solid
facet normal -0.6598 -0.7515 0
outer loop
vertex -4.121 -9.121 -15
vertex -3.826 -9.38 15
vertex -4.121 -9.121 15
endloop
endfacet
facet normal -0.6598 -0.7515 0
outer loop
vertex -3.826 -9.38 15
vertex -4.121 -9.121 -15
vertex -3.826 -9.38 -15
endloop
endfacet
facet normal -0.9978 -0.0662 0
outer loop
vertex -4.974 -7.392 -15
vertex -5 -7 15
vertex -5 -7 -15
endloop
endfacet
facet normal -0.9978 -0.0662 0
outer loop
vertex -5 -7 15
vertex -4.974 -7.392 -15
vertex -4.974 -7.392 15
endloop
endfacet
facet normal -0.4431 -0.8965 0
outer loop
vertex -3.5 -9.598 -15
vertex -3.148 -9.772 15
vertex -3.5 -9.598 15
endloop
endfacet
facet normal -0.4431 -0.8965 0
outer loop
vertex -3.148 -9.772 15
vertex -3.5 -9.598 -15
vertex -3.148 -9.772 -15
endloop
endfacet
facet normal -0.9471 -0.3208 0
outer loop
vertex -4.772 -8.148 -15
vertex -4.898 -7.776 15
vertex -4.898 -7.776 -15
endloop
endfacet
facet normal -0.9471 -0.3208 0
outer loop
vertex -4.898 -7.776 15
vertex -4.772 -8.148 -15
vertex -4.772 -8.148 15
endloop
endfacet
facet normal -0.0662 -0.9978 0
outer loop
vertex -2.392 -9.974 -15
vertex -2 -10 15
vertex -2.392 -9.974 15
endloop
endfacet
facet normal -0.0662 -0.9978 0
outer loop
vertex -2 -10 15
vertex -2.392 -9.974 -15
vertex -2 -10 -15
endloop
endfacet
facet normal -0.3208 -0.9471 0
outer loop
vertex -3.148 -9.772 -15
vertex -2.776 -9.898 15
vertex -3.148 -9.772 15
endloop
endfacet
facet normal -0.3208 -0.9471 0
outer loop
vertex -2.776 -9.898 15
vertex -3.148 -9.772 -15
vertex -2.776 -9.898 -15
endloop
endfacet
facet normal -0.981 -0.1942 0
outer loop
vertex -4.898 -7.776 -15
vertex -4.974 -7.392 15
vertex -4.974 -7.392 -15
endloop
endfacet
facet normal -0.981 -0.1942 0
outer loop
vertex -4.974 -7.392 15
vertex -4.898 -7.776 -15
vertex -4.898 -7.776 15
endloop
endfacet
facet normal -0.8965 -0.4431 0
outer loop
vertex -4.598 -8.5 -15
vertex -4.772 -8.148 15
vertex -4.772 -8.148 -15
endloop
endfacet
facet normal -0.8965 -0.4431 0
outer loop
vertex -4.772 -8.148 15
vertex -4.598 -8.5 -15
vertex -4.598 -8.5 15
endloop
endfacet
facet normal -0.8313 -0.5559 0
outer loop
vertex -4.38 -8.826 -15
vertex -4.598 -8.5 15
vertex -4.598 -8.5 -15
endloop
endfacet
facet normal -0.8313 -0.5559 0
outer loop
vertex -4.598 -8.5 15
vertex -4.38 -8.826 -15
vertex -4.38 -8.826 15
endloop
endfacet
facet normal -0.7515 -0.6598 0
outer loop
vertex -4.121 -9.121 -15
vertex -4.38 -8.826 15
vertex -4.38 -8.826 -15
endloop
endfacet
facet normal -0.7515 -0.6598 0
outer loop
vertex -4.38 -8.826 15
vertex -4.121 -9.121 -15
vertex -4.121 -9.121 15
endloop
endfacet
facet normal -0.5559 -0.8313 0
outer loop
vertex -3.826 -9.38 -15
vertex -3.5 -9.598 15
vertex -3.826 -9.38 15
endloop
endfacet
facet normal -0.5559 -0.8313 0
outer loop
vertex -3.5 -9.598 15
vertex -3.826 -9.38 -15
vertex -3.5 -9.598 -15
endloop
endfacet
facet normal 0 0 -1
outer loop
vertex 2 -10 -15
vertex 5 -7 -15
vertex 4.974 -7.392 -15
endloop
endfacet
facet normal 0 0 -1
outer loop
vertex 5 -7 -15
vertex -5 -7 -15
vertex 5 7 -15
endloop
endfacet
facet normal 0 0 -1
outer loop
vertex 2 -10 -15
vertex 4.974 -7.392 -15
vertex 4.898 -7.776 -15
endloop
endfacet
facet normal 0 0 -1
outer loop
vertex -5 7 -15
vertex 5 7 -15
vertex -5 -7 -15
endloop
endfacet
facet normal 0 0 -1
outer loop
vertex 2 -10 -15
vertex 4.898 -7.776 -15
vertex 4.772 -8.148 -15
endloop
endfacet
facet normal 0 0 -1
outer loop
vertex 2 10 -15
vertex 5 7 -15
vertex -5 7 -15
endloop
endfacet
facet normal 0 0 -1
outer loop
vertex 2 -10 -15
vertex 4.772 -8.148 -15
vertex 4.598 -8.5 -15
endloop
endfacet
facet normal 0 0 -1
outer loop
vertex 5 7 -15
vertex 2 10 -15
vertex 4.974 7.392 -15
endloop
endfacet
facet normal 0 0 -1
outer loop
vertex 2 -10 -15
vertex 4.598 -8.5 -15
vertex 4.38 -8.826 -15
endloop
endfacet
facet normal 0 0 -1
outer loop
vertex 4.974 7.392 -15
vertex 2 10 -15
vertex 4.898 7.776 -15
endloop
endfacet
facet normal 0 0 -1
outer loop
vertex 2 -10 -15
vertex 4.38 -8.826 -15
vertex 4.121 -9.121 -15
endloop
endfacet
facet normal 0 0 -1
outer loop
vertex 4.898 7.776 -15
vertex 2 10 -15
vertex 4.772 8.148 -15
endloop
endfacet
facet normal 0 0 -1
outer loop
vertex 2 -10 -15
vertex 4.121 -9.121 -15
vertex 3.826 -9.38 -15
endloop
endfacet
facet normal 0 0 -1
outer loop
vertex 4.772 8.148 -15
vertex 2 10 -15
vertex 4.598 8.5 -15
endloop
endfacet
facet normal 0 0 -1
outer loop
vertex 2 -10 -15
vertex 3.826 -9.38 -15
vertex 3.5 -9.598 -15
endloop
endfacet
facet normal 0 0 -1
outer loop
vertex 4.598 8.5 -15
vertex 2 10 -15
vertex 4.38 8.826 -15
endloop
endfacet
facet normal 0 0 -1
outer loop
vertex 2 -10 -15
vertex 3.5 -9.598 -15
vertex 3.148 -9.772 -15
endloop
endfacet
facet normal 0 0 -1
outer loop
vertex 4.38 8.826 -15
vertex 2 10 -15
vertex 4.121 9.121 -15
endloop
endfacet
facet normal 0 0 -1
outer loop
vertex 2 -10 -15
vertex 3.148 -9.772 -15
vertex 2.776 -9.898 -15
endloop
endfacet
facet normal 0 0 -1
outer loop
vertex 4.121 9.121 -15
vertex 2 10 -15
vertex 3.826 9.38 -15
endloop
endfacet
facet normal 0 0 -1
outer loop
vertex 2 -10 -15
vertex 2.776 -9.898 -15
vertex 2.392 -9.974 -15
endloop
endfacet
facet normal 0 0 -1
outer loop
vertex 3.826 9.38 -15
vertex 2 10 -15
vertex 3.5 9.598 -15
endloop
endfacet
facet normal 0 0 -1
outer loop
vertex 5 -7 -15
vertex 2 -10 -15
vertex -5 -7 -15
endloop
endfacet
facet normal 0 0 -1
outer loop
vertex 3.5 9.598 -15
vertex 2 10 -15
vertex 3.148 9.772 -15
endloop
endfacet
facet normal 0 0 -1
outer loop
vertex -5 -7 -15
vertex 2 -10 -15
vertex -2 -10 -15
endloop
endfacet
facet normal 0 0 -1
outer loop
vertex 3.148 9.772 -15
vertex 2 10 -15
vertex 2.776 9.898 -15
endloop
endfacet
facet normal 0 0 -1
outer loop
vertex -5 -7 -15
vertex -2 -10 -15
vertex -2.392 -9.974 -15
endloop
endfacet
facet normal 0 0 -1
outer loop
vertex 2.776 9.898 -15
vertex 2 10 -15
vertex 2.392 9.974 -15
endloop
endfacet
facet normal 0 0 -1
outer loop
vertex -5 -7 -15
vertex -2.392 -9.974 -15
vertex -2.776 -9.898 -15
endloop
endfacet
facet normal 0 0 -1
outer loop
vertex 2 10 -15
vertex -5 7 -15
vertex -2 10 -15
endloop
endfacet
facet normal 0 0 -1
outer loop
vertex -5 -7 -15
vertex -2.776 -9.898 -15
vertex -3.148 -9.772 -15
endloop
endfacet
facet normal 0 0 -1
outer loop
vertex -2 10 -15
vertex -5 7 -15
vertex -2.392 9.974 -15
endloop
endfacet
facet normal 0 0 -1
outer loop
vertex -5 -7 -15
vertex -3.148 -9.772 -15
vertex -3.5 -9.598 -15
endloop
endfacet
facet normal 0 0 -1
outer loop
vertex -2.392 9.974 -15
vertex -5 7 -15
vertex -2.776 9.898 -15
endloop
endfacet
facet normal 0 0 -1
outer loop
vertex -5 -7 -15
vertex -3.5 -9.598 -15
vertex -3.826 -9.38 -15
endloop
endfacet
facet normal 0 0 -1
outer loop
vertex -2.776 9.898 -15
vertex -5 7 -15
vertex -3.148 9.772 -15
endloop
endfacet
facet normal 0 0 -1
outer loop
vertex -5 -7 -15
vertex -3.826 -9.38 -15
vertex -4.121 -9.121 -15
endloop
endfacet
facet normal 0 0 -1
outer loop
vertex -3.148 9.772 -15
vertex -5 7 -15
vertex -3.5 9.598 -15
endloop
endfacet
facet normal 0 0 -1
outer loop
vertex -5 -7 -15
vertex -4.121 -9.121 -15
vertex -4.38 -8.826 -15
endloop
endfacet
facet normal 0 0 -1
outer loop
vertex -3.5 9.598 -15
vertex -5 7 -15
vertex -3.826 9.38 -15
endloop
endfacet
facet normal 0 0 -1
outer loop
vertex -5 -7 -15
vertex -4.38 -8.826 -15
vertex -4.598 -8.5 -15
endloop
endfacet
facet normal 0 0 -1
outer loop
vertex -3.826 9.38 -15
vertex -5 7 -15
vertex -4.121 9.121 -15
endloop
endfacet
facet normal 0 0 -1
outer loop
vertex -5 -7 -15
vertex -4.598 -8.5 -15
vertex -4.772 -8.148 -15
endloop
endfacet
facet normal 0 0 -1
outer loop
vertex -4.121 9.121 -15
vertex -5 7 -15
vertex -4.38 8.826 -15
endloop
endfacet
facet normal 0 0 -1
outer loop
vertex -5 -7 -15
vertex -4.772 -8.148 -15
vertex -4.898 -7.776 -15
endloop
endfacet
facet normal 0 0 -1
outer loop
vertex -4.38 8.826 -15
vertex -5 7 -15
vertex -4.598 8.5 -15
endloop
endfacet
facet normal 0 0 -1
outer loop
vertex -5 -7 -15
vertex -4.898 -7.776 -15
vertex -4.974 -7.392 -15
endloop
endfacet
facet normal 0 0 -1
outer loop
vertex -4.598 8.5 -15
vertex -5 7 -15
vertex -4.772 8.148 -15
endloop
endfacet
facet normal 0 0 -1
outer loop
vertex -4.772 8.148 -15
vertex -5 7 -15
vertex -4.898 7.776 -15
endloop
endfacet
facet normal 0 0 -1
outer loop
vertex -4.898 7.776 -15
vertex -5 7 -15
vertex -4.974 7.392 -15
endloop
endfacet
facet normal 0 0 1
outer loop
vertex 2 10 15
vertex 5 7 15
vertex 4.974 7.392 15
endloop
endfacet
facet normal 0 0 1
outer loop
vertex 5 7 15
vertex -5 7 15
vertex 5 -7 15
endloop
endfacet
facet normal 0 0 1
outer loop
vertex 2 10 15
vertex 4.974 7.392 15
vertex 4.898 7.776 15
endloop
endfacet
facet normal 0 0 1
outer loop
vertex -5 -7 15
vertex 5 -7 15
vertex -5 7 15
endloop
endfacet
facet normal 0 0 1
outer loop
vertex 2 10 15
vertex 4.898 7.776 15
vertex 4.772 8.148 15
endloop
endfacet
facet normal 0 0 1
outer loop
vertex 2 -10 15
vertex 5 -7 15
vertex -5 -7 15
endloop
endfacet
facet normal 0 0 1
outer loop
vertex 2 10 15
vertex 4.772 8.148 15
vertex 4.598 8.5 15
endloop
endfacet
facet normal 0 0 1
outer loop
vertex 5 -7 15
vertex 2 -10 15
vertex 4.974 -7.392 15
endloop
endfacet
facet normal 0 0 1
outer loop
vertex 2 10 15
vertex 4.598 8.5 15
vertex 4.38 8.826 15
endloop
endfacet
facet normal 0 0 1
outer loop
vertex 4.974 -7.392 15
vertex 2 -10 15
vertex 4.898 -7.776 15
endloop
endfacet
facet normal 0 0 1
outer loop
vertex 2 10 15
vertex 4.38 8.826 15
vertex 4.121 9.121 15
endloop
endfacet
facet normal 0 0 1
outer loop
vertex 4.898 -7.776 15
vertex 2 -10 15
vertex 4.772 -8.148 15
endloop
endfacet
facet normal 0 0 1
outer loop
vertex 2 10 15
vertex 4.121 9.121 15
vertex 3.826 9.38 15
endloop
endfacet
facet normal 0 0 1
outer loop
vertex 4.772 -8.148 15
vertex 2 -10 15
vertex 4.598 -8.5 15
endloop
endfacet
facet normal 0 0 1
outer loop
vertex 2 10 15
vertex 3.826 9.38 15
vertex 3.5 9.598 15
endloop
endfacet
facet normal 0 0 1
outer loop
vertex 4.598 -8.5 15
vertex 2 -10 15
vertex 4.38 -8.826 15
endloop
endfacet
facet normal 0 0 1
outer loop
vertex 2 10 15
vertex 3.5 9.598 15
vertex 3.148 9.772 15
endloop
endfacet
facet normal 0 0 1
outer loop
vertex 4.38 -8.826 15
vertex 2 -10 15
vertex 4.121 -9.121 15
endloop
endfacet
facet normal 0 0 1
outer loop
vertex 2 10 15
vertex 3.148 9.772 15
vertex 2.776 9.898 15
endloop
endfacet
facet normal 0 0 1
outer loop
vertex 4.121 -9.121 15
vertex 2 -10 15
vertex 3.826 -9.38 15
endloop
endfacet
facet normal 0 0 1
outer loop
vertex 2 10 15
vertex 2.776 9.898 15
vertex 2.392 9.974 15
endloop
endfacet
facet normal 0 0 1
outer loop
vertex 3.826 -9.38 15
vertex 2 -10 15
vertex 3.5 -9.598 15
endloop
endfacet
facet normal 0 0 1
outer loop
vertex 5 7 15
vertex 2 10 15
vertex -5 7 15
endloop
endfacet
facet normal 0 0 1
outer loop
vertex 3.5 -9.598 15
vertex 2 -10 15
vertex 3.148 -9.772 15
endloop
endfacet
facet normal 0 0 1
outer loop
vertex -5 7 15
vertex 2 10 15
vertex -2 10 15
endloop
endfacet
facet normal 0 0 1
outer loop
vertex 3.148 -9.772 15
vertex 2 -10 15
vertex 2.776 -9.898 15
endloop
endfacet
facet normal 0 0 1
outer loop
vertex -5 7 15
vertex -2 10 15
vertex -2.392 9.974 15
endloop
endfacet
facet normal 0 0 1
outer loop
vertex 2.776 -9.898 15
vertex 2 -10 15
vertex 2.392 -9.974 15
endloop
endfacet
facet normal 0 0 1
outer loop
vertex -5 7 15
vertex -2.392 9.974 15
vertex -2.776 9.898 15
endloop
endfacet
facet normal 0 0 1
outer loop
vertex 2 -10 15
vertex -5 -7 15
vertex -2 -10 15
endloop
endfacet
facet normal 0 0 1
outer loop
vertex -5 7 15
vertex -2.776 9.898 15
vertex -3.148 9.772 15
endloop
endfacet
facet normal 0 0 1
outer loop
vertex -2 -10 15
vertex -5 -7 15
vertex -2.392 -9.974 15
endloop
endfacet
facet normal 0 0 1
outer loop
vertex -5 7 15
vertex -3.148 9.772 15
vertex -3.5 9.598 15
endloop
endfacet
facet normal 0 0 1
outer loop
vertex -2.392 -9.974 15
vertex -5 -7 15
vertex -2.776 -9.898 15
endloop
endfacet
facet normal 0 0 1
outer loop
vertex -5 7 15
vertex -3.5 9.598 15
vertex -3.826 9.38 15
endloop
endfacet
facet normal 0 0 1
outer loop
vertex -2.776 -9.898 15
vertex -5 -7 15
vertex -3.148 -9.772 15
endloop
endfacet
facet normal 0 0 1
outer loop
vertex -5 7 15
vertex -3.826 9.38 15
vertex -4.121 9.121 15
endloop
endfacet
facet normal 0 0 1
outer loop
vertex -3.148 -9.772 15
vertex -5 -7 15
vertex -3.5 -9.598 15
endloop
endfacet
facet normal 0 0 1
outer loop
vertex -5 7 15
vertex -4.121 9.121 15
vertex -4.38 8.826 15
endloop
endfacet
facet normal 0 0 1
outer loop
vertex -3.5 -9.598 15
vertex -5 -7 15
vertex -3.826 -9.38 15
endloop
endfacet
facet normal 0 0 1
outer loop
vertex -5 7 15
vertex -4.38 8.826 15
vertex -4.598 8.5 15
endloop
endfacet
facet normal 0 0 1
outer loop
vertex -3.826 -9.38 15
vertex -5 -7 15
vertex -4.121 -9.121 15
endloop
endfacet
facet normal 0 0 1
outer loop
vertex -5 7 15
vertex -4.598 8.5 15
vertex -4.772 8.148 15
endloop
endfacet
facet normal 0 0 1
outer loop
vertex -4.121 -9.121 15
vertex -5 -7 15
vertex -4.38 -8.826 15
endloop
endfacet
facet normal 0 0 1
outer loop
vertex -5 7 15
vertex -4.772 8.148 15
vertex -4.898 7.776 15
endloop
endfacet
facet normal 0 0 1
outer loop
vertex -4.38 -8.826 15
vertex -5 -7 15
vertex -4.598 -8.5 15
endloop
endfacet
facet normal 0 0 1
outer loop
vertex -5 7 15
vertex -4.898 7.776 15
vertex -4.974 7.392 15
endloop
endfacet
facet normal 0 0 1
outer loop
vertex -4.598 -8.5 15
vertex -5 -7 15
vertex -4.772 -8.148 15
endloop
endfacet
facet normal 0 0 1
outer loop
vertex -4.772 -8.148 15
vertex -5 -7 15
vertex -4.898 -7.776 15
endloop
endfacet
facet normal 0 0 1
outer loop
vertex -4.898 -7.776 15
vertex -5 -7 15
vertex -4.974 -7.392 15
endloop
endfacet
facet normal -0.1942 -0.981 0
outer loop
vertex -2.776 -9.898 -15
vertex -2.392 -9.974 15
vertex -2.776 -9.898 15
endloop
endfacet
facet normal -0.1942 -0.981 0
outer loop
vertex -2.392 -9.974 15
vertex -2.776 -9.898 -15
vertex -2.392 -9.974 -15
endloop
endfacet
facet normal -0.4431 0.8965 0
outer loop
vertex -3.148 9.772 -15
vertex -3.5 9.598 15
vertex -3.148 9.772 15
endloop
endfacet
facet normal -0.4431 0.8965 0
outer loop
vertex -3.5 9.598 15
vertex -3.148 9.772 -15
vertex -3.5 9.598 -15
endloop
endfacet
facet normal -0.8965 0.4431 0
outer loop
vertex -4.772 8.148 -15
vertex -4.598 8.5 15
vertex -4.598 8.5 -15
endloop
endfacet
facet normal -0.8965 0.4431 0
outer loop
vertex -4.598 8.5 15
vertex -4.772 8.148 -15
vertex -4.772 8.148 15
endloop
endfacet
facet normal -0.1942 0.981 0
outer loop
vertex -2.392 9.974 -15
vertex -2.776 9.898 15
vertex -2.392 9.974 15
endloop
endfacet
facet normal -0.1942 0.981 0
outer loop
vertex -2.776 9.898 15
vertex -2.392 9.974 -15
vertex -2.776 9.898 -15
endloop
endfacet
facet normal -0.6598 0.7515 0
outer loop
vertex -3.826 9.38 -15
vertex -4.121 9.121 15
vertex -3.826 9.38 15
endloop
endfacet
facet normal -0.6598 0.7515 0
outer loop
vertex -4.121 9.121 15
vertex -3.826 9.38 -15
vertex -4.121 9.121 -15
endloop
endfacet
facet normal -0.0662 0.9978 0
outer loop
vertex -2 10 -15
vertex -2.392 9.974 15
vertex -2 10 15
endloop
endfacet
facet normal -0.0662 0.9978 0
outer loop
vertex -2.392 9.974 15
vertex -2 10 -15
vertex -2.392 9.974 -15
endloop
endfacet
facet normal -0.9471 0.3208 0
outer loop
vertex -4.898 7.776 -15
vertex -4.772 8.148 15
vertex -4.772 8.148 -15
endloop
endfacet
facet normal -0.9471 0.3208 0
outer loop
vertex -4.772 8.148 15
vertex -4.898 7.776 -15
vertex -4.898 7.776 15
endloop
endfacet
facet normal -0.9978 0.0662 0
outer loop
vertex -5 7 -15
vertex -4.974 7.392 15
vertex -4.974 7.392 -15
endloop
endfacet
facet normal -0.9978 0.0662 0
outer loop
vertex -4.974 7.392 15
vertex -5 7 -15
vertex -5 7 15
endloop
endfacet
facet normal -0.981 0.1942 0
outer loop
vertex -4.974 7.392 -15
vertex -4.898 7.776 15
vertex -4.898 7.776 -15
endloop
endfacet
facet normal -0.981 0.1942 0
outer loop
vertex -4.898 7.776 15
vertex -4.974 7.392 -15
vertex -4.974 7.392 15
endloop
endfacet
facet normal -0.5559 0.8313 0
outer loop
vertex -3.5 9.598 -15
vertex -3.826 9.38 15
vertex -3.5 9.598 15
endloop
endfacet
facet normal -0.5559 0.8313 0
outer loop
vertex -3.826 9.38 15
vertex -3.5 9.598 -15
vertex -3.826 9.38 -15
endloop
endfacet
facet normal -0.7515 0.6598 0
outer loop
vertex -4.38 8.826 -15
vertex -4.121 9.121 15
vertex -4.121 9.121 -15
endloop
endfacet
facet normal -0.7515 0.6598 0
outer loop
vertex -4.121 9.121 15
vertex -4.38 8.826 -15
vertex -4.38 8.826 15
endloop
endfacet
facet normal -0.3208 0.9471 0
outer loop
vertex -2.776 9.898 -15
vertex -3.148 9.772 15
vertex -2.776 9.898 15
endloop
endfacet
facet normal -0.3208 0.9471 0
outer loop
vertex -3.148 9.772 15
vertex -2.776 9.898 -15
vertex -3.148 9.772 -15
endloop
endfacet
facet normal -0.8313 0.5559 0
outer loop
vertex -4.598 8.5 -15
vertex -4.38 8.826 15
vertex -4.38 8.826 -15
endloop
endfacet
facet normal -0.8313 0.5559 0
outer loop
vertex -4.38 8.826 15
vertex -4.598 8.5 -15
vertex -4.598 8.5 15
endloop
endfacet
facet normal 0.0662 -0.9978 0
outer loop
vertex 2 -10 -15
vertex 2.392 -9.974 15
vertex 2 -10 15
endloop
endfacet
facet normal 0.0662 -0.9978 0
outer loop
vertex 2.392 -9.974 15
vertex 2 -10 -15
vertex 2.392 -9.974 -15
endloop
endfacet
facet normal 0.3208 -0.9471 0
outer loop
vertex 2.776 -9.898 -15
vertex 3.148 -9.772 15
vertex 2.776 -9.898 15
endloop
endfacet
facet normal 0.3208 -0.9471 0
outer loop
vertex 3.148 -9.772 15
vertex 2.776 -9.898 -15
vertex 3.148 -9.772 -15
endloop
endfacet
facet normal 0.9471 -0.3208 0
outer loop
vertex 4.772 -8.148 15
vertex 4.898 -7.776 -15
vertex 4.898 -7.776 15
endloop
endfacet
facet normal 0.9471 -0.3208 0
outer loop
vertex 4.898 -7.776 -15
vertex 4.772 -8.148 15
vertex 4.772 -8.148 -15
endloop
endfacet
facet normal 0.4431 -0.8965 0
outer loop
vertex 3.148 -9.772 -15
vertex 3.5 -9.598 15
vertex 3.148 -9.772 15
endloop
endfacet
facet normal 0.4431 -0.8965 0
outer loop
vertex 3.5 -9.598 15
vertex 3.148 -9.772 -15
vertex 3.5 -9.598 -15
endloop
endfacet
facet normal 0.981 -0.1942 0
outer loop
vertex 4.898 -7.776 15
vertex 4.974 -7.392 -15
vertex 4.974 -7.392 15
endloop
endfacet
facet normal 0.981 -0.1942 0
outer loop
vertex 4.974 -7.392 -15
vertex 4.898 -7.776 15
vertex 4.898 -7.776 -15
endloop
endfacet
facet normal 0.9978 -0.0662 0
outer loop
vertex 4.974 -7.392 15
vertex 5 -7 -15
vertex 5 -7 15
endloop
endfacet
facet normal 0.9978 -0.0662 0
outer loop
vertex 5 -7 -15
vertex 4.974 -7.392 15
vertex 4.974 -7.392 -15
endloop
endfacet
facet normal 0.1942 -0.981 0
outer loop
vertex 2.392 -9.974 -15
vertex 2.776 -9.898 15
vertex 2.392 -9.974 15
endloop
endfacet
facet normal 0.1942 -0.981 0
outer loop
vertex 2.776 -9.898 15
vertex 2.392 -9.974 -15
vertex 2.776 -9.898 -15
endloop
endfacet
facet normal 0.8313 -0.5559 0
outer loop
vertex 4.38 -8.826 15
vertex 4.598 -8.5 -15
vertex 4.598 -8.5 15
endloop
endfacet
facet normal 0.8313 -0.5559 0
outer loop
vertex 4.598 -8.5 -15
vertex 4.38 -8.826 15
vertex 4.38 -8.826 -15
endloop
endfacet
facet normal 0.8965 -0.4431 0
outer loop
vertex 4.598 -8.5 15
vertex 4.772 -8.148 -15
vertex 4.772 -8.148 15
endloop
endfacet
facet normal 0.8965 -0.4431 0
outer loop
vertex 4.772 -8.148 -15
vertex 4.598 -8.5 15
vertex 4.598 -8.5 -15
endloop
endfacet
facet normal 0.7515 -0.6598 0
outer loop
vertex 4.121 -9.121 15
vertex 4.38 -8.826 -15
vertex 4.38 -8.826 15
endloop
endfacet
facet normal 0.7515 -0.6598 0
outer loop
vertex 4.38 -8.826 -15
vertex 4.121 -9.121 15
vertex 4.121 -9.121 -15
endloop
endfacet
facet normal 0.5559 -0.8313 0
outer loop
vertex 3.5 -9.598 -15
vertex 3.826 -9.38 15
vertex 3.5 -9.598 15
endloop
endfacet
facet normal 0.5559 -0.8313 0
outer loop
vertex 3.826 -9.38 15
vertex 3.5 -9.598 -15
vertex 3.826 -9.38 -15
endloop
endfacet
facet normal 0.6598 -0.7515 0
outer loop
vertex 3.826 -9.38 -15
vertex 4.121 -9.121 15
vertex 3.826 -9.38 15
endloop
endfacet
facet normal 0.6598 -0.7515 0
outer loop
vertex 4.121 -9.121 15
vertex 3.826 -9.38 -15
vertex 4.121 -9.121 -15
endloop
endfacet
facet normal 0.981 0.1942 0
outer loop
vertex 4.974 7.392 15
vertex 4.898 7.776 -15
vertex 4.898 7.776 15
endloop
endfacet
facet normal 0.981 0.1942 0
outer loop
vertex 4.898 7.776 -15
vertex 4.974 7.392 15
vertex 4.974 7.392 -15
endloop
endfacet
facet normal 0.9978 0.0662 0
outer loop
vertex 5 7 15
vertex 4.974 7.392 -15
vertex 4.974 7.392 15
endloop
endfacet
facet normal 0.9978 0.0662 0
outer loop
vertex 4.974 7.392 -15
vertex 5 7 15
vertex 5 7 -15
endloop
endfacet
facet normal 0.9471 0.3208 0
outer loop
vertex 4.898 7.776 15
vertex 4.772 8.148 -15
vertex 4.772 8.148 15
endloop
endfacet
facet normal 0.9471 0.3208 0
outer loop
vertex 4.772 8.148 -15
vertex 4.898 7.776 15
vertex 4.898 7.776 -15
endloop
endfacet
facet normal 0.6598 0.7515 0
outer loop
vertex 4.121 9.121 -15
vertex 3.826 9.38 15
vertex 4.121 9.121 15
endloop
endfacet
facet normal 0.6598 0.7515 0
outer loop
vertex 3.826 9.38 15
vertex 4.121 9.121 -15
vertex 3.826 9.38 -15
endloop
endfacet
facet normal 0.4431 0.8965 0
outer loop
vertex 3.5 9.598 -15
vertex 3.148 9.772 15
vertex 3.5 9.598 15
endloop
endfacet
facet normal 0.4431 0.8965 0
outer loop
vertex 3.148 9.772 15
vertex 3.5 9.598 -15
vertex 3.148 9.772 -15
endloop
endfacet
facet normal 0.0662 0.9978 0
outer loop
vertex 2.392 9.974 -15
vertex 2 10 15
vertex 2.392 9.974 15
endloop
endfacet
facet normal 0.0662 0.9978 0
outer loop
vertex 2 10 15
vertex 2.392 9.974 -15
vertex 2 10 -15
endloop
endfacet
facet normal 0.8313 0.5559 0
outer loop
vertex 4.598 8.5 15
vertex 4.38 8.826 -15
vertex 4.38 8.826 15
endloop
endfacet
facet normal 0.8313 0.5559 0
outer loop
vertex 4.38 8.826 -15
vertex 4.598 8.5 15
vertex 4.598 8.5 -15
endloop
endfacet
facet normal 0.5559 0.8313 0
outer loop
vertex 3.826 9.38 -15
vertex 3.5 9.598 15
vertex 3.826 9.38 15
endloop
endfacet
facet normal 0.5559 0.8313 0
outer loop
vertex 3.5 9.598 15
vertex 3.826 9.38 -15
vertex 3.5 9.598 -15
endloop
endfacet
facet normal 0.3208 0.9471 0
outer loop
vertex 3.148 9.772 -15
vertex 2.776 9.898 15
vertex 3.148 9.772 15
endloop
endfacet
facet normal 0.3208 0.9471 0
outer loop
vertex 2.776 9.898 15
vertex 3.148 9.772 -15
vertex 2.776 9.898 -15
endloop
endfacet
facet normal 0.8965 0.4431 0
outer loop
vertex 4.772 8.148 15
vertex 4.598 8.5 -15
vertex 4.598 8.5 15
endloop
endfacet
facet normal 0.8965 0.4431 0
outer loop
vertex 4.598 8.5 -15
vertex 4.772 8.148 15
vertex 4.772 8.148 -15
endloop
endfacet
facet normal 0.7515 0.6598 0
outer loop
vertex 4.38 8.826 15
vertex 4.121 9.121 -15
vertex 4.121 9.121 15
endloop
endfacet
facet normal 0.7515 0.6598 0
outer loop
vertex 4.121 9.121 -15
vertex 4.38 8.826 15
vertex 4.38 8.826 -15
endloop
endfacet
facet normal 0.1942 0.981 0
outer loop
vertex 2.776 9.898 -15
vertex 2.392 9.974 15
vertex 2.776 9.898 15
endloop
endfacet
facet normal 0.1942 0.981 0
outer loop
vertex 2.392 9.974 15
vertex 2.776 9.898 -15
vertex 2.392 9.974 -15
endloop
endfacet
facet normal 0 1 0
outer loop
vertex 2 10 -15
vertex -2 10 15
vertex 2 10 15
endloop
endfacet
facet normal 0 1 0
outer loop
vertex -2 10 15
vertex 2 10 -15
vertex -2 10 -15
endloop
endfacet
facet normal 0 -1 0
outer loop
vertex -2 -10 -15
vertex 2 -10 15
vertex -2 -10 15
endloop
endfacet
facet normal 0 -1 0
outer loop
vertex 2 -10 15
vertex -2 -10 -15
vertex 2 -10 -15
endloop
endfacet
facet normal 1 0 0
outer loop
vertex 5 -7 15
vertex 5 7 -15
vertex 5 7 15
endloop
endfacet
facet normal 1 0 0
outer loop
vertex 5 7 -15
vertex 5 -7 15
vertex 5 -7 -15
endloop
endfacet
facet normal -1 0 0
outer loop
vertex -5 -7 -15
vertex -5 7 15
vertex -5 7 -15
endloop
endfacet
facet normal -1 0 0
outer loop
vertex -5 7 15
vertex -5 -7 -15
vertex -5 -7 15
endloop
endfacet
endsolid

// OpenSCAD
use <MCAD/boxes.scad>

$fa = 1;
$fs = 0.4;
roundedBox(size=[10,20,30],radius=3, sidesonly=true);
